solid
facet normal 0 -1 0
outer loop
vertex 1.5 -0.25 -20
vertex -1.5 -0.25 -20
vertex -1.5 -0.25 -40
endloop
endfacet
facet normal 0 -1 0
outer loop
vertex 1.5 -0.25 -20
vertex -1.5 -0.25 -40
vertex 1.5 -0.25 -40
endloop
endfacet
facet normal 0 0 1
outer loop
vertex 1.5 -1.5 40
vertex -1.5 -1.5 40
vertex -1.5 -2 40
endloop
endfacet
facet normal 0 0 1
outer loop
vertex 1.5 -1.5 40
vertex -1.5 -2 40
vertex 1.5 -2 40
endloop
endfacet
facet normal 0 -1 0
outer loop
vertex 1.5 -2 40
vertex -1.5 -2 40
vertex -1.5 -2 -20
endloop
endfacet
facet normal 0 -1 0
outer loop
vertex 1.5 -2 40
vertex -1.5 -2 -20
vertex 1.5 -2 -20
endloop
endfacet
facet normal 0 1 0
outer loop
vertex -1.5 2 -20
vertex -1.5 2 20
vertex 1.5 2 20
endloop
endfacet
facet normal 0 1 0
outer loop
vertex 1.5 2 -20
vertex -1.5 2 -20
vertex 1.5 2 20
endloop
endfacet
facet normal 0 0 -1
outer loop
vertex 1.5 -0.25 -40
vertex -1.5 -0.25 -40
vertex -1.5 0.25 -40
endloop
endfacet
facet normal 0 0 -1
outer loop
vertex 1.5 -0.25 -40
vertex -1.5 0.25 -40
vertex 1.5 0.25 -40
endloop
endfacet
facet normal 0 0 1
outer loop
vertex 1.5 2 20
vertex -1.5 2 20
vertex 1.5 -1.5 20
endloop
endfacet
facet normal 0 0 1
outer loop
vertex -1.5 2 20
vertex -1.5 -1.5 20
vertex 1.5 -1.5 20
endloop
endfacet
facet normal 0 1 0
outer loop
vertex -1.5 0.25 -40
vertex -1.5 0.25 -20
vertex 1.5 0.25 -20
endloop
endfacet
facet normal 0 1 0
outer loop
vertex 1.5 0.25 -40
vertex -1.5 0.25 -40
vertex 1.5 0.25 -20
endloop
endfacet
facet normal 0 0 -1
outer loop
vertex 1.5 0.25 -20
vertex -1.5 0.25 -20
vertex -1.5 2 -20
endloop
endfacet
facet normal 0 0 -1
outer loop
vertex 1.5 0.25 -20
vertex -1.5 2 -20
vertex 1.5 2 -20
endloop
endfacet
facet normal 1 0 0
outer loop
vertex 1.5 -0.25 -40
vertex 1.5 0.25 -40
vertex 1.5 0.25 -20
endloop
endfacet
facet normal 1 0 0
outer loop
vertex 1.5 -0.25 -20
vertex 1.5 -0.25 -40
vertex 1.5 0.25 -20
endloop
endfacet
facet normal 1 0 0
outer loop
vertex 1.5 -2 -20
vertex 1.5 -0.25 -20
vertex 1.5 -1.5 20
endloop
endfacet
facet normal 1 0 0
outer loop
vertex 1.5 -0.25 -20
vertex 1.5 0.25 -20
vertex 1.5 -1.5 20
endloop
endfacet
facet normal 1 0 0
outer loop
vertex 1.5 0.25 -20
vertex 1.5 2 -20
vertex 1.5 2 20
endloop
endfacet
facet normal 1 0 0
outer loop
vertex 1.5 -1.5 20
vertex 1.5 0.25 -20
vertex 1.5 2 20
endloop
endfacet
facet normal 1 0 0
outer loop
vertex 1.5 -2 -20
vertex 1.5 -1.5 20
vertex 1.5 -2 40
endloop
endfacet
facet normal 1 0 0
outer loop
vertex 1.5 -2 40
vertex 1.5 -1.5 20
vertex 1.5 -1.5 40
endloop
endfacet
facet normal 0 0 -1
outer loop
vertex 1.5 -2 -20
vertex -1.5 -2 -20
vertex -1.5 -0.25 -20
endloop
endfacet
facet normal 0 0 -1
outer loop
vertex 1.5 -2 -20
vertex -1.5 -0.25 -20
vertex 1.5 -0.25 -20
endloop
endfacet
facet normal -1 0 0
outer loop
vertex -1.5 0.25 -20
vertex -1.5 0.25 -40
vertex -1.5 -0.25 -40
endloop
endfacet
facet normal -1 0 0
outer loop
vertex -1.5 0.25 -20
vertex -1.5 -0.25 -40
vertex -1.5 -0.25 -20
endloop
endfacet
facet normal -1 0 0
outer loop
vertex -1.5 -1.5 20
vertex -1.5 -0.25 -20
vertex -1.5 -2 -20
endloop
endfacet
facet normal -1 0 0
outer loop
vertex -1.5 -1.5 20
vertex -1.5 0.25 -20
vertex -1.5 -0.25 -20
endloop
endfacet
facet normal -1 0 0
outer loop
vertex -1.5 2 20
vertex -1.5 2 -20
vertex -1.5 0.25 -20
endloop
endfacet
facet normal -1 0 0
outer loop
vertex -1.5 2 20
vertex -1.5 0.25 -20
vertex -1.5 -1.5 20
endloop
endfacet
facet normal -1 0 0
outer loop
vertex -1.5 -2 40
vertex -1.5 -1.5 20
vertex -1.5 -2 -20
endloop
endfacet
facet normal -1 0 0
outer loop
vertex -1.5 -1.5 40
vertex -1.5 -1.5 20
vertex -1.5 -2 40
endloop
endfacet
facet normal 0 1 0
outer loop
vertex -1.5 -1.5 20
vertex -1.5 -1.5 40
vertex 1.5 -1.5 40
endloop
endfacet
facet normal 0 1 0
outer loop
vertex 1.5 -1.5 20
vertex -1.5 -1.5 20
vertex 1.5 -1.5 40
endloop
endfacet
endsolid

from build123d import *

# Parameters (mm, degrees)
F0_W     = 3
F0_H     = 20
F1_DEPTH = 0.25
F2_W     = 3
F2_H     = 40
F3_DEPTH = 2
F4_W     = 3
F4_H     = 20
F5_DEPTH = 2
F6_DEPTH = 1.5


with BuildPart() as f1:
    # F0 (on Front) → F1 (new body, symmetric)
    with BuildSketch(Plane.XZ):
        with Locations((0, -30)):
            Rectangle(F0_W, F0_H)
    extrude(amount=F1_DEPTH, both=True)

    # F2 (on Front) → F3 (join, symmetric)
    with BuildSketch(Plane.XZ):
        Rectangle(F2_W, F2_H)
    extrude(amount=F3_DEPTH, both=True)

    # F4 (on Front) → F5 (join)
    with BuildSketch(Plane.XZ):
        with Locations((0, 30)):
            Rectangle(F4_W, F4_H)
    extrude(amount=F5_DEPTH)

    # F4 (on Front) → F6 (cut)
    with BuildSketch(Plane.XZ):
        with Locations((0, 30)):
            Rectangle(F4_W, F4_H)
    extrude(amount=F6_DEPTH, mode=Mode.SUBTRACT)


solid = f1.part
